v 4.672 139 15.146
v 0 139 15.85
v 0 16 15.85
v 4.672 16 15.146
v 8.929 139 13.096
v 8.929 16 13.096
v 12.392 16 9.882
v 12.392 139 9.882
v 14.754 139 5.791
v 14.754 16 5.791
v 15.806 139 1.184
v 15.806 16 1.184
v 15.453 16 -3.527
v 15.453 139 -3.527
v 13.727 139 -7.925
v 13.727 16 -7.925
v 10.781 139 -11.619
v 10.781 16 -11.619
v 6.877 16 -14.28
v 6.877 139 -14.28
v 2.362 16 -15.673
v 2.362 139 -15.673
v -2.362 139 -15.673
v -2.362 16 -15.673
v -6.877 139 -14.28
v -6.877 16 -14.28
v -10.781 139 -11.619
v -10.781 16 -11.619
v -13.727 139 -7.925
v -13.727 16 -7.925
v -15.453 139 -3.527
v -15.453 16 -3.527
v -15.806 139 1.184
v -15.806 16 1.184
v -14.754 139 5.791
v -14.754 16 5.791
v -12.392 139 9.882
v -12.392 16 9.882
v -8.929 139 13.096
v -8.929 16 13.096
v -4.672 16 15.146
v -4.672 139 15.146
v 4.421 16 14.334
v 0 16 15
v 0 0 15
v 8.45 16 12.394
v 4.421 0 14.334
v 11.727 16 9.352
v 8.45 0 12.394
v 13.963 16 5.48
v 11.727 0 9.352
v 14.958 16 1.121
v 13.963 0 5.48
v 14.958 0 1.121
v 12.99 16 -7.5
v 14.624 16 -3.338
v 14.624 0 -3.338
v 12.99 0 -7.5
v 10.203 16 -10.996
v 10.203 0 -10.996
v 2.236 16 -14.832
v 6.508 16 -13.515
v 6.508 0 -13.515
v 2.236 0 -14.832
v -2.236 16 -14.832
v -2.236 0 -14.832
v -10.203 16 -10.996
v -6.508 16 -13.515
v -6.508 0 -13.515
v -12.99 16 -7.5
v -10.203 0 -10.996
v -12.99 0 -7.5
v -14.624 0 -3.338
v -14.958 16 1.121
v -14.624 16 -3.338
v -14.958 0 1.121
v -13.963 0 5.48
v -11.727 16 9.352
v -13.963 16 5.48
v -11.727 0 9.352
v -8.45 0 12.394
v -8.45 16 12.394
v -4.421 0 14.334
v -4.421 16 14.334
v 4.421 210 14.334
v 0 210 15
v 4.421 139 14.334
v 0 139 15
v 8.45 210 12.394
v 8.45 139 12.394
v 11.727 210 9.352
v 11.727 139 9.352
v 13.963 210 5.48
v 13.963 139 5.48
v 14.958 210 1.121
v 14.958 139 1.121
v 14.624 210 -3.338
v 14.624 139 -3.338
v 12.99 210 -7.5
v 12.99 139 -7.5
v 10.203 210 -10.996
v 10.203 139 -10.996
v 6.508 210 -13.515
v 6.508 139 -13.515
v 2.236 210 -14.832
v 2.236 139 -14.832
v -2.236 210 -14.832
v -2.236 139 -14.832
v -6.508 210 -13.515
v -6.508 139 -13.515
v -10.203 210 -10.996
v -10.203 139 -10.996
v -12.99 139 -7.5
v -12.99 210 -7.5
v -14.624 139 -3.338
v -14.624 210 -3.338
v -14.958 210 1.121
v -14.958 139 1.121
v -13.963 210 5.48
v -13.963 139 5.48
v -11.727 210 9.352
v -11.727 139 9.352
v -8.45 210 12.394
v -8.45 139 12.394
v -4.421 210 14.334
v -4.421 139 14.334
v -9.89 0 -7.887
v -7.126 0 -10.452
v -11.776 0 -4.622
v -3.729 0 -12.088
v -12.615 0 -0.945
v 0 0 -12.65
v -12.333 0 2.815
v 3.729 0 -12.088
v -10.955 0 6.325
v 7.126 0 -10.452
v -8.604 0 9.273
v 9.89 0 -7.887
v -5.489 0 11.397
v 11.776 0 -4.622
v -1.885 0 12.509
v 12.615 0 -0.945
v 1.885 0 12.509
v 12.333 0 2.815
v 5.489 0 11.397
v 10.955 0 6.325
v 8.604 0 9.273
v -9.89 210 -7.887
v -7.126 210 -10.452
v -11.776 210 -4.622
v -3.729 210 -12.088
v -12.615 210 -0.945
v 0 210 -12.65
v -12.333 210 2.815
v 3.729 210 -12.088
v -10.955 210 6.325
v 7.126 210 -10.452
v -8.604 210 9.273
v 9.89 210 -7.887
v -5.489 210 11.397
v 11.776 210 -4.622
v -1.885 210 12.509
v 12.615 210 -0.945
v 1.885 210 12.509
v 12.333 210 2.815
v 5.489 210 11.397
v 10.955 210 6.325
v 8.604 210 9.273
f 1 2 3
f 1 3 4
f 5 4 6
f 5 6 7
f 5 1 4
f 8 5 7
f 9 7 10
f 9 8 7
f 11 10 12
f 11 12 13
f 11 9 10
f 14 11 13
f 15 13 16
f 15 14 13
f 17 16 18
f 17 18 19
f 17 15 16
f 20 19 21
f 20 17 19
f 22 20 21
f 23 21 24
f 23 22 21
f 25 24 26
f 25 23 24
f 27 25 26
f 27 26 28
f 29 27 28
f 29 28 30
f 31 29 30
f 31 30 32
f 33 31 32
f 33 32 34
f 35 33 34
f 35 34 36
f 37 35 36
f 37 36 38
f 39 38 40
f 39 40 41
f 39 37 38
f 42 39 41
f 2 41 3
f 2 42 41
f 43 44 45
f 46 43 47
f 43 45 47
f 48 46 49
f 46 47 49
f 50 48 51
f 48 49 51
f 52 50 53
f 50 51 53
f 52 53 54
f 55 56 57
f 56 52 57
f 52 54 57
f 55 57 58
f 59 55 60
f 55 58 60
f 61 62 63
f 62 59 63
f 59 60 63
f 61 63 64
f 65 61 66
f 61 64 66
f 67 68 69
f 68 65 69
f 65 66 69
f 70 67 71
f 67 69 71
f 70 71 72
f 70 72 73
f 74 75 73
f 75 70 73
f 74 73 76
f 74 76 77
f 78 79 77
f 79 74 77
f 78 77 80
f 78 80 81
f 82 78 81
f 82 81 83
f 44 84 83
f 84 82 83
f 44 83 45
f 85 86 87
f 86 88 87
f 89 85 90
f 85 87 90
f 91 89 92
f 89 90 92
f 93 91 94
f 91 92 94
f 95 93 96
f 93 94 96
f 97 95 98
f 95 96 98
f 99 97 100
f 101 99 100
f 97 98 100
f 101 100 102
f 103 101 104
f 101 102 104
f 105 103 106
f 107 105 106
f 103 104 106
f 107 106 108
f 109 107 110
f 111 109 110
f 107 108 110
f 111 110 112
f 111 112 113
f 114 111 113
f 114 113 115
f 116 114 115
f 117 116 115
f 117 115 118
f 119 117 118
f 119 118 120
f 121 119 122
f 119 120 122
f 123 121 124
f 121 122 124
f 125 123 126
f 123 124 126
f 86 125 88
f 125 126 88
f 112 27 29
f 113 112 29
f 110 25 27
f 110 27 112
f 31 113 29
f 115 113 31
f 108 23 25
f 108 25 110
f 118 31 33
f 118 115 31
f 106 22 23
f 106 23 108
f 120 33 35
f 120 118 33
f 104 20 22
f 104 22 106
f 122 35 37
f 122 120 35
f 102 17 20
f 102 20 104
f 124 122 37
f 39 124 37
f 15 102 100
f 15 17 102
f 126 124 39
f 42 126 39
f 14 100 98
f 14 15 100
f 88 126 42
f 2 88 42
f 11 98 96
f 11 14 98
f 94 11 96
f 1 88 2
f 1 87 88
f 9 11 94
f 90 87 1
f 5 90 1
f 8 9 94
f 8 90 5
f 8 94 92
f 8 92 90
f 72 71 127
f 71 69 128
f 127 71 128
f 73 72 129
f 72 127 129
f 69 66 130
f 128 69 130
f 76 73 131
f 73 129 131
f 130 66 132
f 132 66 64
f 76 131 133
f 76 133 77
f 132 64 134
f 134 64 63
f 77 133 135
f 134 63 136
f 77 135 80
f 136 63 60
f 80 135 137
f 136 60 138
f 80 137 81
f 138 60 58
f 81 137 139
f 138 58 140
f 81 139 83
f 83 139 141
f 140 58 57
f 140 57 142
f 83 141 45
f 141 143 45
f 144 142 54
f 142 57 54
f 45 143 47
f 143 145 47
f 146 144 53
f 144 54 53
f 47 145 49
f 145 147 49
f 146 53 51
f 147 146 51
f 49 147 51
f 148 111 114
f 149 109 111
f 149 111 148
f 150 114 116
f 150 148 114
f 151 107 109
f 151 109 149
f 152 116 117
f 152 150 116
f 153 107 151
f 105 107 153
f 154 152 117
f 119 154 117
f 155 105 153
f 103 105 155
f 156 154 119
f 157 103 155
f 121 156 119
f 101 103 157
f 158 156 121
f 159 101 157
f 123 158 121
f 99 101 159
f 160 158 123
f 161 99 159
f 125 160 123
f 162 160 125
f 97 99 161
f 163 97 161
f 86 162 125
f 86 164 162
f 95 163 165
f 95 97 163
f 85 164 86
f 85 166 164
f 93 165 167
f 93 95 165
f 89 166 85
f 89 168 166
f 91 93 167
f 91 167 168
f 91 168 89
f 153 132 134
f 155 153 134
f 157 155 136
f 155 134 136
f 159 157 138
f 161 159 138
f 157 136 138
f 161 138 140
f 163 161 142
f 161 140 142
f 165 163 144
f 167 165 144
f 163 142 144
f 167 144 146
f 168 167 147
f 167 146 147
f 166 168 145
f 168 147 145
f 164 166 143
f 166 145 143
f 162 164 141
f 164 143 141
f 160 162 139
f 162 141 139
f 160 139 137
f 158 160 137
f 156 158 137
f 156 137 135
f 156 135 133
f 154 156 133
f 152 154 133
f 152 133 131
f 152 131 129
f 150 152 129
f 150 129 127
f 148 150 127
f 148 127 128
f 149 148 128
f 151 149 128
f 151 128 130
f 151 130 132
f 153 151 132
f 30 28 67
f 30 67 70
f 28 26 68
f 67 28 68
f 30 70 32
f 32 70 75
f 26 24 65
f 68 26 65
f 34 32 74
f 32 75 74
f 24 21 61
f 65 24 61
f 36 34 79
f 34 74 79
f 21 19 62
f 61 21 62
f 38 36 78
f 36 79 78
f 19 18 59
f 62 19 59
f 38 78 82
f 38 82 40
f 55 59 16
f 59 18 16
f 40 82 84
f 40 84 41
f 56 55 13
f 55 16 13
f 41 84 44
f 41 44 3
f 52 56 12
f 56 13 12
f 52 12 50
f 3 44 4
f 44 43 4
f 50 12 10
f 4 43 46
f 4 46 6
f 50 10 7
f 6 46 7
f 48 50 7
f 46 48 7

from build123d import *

# Parameters (mm, degrees)
SKETCH1_R           = 15
BOSS_EXTRUDE1_DEPTH = 155
BOSS_EXTRUDE2_START = -16
SKETCH2_R           = 15.85
BOSS_EXTRUDE2_DEPTH = 123
SKETCH3_R           = 15
BOSS_EXTRUDE3_DEPTH = 55
SKETCH6_R           = 12.65
CUT_EXTRUDE2_DEPTH  = 212.192909445


with BuildPart() as part:
    # Sketch1 → Boss-Extrude1 (new body)
    with BuildSketch(Plane(origin=(0, 0, 0), x_dir=(1, 0, 0), z_dir=(0, 1, 0))):
        with Locations(Location((0, 0, 0), (0, 0, 270))):
            Circle(SKETCH1_R)
    extrude(amount=BOSS_EXTRUDE1_DEPTH)

    # Sketch2 → Boss-Extrude2 (add)
    with BuildSketch(Plane(origin=(0, 155, 0), x_dir=(1, 0, 0), z_dir=(0, 1, 0)).offset(BOSS_EXTRUDE2_START)):
        with Locations(Location((0, 0, 0), (0, 0, 270))):
            Circle(SKETCH2_R)
    extrude(amount=-BOSS_EXTRUDE2_DEPTH)

    # Sketch3 → Boss-Extrude3 (add)
    with BuildSketch(Plane(origin=(0, 155, 0), x_dir=(1, 0, 0), z_dir=(0, 1, 0))):
        with Locations(Location((0, 0, 0), (0, 0, 270))):
            Circle(SKETCH3_R)
    extrude(amount=BOSS_EXTRUDE3_DEPTH)

    # Sketch6 → Cut-Extrude2 (cut, through all)
    with BuildSketch(Plane.XZ):
        with Locations(Location((0, 0, 0), (0, 0, 270))):
            Circle(SKETCH6_R)
    extrude(amount=-CUT_EXTRUDE2_DEPTH, mode=Mode.SUBTRACT)


solid = part.part
